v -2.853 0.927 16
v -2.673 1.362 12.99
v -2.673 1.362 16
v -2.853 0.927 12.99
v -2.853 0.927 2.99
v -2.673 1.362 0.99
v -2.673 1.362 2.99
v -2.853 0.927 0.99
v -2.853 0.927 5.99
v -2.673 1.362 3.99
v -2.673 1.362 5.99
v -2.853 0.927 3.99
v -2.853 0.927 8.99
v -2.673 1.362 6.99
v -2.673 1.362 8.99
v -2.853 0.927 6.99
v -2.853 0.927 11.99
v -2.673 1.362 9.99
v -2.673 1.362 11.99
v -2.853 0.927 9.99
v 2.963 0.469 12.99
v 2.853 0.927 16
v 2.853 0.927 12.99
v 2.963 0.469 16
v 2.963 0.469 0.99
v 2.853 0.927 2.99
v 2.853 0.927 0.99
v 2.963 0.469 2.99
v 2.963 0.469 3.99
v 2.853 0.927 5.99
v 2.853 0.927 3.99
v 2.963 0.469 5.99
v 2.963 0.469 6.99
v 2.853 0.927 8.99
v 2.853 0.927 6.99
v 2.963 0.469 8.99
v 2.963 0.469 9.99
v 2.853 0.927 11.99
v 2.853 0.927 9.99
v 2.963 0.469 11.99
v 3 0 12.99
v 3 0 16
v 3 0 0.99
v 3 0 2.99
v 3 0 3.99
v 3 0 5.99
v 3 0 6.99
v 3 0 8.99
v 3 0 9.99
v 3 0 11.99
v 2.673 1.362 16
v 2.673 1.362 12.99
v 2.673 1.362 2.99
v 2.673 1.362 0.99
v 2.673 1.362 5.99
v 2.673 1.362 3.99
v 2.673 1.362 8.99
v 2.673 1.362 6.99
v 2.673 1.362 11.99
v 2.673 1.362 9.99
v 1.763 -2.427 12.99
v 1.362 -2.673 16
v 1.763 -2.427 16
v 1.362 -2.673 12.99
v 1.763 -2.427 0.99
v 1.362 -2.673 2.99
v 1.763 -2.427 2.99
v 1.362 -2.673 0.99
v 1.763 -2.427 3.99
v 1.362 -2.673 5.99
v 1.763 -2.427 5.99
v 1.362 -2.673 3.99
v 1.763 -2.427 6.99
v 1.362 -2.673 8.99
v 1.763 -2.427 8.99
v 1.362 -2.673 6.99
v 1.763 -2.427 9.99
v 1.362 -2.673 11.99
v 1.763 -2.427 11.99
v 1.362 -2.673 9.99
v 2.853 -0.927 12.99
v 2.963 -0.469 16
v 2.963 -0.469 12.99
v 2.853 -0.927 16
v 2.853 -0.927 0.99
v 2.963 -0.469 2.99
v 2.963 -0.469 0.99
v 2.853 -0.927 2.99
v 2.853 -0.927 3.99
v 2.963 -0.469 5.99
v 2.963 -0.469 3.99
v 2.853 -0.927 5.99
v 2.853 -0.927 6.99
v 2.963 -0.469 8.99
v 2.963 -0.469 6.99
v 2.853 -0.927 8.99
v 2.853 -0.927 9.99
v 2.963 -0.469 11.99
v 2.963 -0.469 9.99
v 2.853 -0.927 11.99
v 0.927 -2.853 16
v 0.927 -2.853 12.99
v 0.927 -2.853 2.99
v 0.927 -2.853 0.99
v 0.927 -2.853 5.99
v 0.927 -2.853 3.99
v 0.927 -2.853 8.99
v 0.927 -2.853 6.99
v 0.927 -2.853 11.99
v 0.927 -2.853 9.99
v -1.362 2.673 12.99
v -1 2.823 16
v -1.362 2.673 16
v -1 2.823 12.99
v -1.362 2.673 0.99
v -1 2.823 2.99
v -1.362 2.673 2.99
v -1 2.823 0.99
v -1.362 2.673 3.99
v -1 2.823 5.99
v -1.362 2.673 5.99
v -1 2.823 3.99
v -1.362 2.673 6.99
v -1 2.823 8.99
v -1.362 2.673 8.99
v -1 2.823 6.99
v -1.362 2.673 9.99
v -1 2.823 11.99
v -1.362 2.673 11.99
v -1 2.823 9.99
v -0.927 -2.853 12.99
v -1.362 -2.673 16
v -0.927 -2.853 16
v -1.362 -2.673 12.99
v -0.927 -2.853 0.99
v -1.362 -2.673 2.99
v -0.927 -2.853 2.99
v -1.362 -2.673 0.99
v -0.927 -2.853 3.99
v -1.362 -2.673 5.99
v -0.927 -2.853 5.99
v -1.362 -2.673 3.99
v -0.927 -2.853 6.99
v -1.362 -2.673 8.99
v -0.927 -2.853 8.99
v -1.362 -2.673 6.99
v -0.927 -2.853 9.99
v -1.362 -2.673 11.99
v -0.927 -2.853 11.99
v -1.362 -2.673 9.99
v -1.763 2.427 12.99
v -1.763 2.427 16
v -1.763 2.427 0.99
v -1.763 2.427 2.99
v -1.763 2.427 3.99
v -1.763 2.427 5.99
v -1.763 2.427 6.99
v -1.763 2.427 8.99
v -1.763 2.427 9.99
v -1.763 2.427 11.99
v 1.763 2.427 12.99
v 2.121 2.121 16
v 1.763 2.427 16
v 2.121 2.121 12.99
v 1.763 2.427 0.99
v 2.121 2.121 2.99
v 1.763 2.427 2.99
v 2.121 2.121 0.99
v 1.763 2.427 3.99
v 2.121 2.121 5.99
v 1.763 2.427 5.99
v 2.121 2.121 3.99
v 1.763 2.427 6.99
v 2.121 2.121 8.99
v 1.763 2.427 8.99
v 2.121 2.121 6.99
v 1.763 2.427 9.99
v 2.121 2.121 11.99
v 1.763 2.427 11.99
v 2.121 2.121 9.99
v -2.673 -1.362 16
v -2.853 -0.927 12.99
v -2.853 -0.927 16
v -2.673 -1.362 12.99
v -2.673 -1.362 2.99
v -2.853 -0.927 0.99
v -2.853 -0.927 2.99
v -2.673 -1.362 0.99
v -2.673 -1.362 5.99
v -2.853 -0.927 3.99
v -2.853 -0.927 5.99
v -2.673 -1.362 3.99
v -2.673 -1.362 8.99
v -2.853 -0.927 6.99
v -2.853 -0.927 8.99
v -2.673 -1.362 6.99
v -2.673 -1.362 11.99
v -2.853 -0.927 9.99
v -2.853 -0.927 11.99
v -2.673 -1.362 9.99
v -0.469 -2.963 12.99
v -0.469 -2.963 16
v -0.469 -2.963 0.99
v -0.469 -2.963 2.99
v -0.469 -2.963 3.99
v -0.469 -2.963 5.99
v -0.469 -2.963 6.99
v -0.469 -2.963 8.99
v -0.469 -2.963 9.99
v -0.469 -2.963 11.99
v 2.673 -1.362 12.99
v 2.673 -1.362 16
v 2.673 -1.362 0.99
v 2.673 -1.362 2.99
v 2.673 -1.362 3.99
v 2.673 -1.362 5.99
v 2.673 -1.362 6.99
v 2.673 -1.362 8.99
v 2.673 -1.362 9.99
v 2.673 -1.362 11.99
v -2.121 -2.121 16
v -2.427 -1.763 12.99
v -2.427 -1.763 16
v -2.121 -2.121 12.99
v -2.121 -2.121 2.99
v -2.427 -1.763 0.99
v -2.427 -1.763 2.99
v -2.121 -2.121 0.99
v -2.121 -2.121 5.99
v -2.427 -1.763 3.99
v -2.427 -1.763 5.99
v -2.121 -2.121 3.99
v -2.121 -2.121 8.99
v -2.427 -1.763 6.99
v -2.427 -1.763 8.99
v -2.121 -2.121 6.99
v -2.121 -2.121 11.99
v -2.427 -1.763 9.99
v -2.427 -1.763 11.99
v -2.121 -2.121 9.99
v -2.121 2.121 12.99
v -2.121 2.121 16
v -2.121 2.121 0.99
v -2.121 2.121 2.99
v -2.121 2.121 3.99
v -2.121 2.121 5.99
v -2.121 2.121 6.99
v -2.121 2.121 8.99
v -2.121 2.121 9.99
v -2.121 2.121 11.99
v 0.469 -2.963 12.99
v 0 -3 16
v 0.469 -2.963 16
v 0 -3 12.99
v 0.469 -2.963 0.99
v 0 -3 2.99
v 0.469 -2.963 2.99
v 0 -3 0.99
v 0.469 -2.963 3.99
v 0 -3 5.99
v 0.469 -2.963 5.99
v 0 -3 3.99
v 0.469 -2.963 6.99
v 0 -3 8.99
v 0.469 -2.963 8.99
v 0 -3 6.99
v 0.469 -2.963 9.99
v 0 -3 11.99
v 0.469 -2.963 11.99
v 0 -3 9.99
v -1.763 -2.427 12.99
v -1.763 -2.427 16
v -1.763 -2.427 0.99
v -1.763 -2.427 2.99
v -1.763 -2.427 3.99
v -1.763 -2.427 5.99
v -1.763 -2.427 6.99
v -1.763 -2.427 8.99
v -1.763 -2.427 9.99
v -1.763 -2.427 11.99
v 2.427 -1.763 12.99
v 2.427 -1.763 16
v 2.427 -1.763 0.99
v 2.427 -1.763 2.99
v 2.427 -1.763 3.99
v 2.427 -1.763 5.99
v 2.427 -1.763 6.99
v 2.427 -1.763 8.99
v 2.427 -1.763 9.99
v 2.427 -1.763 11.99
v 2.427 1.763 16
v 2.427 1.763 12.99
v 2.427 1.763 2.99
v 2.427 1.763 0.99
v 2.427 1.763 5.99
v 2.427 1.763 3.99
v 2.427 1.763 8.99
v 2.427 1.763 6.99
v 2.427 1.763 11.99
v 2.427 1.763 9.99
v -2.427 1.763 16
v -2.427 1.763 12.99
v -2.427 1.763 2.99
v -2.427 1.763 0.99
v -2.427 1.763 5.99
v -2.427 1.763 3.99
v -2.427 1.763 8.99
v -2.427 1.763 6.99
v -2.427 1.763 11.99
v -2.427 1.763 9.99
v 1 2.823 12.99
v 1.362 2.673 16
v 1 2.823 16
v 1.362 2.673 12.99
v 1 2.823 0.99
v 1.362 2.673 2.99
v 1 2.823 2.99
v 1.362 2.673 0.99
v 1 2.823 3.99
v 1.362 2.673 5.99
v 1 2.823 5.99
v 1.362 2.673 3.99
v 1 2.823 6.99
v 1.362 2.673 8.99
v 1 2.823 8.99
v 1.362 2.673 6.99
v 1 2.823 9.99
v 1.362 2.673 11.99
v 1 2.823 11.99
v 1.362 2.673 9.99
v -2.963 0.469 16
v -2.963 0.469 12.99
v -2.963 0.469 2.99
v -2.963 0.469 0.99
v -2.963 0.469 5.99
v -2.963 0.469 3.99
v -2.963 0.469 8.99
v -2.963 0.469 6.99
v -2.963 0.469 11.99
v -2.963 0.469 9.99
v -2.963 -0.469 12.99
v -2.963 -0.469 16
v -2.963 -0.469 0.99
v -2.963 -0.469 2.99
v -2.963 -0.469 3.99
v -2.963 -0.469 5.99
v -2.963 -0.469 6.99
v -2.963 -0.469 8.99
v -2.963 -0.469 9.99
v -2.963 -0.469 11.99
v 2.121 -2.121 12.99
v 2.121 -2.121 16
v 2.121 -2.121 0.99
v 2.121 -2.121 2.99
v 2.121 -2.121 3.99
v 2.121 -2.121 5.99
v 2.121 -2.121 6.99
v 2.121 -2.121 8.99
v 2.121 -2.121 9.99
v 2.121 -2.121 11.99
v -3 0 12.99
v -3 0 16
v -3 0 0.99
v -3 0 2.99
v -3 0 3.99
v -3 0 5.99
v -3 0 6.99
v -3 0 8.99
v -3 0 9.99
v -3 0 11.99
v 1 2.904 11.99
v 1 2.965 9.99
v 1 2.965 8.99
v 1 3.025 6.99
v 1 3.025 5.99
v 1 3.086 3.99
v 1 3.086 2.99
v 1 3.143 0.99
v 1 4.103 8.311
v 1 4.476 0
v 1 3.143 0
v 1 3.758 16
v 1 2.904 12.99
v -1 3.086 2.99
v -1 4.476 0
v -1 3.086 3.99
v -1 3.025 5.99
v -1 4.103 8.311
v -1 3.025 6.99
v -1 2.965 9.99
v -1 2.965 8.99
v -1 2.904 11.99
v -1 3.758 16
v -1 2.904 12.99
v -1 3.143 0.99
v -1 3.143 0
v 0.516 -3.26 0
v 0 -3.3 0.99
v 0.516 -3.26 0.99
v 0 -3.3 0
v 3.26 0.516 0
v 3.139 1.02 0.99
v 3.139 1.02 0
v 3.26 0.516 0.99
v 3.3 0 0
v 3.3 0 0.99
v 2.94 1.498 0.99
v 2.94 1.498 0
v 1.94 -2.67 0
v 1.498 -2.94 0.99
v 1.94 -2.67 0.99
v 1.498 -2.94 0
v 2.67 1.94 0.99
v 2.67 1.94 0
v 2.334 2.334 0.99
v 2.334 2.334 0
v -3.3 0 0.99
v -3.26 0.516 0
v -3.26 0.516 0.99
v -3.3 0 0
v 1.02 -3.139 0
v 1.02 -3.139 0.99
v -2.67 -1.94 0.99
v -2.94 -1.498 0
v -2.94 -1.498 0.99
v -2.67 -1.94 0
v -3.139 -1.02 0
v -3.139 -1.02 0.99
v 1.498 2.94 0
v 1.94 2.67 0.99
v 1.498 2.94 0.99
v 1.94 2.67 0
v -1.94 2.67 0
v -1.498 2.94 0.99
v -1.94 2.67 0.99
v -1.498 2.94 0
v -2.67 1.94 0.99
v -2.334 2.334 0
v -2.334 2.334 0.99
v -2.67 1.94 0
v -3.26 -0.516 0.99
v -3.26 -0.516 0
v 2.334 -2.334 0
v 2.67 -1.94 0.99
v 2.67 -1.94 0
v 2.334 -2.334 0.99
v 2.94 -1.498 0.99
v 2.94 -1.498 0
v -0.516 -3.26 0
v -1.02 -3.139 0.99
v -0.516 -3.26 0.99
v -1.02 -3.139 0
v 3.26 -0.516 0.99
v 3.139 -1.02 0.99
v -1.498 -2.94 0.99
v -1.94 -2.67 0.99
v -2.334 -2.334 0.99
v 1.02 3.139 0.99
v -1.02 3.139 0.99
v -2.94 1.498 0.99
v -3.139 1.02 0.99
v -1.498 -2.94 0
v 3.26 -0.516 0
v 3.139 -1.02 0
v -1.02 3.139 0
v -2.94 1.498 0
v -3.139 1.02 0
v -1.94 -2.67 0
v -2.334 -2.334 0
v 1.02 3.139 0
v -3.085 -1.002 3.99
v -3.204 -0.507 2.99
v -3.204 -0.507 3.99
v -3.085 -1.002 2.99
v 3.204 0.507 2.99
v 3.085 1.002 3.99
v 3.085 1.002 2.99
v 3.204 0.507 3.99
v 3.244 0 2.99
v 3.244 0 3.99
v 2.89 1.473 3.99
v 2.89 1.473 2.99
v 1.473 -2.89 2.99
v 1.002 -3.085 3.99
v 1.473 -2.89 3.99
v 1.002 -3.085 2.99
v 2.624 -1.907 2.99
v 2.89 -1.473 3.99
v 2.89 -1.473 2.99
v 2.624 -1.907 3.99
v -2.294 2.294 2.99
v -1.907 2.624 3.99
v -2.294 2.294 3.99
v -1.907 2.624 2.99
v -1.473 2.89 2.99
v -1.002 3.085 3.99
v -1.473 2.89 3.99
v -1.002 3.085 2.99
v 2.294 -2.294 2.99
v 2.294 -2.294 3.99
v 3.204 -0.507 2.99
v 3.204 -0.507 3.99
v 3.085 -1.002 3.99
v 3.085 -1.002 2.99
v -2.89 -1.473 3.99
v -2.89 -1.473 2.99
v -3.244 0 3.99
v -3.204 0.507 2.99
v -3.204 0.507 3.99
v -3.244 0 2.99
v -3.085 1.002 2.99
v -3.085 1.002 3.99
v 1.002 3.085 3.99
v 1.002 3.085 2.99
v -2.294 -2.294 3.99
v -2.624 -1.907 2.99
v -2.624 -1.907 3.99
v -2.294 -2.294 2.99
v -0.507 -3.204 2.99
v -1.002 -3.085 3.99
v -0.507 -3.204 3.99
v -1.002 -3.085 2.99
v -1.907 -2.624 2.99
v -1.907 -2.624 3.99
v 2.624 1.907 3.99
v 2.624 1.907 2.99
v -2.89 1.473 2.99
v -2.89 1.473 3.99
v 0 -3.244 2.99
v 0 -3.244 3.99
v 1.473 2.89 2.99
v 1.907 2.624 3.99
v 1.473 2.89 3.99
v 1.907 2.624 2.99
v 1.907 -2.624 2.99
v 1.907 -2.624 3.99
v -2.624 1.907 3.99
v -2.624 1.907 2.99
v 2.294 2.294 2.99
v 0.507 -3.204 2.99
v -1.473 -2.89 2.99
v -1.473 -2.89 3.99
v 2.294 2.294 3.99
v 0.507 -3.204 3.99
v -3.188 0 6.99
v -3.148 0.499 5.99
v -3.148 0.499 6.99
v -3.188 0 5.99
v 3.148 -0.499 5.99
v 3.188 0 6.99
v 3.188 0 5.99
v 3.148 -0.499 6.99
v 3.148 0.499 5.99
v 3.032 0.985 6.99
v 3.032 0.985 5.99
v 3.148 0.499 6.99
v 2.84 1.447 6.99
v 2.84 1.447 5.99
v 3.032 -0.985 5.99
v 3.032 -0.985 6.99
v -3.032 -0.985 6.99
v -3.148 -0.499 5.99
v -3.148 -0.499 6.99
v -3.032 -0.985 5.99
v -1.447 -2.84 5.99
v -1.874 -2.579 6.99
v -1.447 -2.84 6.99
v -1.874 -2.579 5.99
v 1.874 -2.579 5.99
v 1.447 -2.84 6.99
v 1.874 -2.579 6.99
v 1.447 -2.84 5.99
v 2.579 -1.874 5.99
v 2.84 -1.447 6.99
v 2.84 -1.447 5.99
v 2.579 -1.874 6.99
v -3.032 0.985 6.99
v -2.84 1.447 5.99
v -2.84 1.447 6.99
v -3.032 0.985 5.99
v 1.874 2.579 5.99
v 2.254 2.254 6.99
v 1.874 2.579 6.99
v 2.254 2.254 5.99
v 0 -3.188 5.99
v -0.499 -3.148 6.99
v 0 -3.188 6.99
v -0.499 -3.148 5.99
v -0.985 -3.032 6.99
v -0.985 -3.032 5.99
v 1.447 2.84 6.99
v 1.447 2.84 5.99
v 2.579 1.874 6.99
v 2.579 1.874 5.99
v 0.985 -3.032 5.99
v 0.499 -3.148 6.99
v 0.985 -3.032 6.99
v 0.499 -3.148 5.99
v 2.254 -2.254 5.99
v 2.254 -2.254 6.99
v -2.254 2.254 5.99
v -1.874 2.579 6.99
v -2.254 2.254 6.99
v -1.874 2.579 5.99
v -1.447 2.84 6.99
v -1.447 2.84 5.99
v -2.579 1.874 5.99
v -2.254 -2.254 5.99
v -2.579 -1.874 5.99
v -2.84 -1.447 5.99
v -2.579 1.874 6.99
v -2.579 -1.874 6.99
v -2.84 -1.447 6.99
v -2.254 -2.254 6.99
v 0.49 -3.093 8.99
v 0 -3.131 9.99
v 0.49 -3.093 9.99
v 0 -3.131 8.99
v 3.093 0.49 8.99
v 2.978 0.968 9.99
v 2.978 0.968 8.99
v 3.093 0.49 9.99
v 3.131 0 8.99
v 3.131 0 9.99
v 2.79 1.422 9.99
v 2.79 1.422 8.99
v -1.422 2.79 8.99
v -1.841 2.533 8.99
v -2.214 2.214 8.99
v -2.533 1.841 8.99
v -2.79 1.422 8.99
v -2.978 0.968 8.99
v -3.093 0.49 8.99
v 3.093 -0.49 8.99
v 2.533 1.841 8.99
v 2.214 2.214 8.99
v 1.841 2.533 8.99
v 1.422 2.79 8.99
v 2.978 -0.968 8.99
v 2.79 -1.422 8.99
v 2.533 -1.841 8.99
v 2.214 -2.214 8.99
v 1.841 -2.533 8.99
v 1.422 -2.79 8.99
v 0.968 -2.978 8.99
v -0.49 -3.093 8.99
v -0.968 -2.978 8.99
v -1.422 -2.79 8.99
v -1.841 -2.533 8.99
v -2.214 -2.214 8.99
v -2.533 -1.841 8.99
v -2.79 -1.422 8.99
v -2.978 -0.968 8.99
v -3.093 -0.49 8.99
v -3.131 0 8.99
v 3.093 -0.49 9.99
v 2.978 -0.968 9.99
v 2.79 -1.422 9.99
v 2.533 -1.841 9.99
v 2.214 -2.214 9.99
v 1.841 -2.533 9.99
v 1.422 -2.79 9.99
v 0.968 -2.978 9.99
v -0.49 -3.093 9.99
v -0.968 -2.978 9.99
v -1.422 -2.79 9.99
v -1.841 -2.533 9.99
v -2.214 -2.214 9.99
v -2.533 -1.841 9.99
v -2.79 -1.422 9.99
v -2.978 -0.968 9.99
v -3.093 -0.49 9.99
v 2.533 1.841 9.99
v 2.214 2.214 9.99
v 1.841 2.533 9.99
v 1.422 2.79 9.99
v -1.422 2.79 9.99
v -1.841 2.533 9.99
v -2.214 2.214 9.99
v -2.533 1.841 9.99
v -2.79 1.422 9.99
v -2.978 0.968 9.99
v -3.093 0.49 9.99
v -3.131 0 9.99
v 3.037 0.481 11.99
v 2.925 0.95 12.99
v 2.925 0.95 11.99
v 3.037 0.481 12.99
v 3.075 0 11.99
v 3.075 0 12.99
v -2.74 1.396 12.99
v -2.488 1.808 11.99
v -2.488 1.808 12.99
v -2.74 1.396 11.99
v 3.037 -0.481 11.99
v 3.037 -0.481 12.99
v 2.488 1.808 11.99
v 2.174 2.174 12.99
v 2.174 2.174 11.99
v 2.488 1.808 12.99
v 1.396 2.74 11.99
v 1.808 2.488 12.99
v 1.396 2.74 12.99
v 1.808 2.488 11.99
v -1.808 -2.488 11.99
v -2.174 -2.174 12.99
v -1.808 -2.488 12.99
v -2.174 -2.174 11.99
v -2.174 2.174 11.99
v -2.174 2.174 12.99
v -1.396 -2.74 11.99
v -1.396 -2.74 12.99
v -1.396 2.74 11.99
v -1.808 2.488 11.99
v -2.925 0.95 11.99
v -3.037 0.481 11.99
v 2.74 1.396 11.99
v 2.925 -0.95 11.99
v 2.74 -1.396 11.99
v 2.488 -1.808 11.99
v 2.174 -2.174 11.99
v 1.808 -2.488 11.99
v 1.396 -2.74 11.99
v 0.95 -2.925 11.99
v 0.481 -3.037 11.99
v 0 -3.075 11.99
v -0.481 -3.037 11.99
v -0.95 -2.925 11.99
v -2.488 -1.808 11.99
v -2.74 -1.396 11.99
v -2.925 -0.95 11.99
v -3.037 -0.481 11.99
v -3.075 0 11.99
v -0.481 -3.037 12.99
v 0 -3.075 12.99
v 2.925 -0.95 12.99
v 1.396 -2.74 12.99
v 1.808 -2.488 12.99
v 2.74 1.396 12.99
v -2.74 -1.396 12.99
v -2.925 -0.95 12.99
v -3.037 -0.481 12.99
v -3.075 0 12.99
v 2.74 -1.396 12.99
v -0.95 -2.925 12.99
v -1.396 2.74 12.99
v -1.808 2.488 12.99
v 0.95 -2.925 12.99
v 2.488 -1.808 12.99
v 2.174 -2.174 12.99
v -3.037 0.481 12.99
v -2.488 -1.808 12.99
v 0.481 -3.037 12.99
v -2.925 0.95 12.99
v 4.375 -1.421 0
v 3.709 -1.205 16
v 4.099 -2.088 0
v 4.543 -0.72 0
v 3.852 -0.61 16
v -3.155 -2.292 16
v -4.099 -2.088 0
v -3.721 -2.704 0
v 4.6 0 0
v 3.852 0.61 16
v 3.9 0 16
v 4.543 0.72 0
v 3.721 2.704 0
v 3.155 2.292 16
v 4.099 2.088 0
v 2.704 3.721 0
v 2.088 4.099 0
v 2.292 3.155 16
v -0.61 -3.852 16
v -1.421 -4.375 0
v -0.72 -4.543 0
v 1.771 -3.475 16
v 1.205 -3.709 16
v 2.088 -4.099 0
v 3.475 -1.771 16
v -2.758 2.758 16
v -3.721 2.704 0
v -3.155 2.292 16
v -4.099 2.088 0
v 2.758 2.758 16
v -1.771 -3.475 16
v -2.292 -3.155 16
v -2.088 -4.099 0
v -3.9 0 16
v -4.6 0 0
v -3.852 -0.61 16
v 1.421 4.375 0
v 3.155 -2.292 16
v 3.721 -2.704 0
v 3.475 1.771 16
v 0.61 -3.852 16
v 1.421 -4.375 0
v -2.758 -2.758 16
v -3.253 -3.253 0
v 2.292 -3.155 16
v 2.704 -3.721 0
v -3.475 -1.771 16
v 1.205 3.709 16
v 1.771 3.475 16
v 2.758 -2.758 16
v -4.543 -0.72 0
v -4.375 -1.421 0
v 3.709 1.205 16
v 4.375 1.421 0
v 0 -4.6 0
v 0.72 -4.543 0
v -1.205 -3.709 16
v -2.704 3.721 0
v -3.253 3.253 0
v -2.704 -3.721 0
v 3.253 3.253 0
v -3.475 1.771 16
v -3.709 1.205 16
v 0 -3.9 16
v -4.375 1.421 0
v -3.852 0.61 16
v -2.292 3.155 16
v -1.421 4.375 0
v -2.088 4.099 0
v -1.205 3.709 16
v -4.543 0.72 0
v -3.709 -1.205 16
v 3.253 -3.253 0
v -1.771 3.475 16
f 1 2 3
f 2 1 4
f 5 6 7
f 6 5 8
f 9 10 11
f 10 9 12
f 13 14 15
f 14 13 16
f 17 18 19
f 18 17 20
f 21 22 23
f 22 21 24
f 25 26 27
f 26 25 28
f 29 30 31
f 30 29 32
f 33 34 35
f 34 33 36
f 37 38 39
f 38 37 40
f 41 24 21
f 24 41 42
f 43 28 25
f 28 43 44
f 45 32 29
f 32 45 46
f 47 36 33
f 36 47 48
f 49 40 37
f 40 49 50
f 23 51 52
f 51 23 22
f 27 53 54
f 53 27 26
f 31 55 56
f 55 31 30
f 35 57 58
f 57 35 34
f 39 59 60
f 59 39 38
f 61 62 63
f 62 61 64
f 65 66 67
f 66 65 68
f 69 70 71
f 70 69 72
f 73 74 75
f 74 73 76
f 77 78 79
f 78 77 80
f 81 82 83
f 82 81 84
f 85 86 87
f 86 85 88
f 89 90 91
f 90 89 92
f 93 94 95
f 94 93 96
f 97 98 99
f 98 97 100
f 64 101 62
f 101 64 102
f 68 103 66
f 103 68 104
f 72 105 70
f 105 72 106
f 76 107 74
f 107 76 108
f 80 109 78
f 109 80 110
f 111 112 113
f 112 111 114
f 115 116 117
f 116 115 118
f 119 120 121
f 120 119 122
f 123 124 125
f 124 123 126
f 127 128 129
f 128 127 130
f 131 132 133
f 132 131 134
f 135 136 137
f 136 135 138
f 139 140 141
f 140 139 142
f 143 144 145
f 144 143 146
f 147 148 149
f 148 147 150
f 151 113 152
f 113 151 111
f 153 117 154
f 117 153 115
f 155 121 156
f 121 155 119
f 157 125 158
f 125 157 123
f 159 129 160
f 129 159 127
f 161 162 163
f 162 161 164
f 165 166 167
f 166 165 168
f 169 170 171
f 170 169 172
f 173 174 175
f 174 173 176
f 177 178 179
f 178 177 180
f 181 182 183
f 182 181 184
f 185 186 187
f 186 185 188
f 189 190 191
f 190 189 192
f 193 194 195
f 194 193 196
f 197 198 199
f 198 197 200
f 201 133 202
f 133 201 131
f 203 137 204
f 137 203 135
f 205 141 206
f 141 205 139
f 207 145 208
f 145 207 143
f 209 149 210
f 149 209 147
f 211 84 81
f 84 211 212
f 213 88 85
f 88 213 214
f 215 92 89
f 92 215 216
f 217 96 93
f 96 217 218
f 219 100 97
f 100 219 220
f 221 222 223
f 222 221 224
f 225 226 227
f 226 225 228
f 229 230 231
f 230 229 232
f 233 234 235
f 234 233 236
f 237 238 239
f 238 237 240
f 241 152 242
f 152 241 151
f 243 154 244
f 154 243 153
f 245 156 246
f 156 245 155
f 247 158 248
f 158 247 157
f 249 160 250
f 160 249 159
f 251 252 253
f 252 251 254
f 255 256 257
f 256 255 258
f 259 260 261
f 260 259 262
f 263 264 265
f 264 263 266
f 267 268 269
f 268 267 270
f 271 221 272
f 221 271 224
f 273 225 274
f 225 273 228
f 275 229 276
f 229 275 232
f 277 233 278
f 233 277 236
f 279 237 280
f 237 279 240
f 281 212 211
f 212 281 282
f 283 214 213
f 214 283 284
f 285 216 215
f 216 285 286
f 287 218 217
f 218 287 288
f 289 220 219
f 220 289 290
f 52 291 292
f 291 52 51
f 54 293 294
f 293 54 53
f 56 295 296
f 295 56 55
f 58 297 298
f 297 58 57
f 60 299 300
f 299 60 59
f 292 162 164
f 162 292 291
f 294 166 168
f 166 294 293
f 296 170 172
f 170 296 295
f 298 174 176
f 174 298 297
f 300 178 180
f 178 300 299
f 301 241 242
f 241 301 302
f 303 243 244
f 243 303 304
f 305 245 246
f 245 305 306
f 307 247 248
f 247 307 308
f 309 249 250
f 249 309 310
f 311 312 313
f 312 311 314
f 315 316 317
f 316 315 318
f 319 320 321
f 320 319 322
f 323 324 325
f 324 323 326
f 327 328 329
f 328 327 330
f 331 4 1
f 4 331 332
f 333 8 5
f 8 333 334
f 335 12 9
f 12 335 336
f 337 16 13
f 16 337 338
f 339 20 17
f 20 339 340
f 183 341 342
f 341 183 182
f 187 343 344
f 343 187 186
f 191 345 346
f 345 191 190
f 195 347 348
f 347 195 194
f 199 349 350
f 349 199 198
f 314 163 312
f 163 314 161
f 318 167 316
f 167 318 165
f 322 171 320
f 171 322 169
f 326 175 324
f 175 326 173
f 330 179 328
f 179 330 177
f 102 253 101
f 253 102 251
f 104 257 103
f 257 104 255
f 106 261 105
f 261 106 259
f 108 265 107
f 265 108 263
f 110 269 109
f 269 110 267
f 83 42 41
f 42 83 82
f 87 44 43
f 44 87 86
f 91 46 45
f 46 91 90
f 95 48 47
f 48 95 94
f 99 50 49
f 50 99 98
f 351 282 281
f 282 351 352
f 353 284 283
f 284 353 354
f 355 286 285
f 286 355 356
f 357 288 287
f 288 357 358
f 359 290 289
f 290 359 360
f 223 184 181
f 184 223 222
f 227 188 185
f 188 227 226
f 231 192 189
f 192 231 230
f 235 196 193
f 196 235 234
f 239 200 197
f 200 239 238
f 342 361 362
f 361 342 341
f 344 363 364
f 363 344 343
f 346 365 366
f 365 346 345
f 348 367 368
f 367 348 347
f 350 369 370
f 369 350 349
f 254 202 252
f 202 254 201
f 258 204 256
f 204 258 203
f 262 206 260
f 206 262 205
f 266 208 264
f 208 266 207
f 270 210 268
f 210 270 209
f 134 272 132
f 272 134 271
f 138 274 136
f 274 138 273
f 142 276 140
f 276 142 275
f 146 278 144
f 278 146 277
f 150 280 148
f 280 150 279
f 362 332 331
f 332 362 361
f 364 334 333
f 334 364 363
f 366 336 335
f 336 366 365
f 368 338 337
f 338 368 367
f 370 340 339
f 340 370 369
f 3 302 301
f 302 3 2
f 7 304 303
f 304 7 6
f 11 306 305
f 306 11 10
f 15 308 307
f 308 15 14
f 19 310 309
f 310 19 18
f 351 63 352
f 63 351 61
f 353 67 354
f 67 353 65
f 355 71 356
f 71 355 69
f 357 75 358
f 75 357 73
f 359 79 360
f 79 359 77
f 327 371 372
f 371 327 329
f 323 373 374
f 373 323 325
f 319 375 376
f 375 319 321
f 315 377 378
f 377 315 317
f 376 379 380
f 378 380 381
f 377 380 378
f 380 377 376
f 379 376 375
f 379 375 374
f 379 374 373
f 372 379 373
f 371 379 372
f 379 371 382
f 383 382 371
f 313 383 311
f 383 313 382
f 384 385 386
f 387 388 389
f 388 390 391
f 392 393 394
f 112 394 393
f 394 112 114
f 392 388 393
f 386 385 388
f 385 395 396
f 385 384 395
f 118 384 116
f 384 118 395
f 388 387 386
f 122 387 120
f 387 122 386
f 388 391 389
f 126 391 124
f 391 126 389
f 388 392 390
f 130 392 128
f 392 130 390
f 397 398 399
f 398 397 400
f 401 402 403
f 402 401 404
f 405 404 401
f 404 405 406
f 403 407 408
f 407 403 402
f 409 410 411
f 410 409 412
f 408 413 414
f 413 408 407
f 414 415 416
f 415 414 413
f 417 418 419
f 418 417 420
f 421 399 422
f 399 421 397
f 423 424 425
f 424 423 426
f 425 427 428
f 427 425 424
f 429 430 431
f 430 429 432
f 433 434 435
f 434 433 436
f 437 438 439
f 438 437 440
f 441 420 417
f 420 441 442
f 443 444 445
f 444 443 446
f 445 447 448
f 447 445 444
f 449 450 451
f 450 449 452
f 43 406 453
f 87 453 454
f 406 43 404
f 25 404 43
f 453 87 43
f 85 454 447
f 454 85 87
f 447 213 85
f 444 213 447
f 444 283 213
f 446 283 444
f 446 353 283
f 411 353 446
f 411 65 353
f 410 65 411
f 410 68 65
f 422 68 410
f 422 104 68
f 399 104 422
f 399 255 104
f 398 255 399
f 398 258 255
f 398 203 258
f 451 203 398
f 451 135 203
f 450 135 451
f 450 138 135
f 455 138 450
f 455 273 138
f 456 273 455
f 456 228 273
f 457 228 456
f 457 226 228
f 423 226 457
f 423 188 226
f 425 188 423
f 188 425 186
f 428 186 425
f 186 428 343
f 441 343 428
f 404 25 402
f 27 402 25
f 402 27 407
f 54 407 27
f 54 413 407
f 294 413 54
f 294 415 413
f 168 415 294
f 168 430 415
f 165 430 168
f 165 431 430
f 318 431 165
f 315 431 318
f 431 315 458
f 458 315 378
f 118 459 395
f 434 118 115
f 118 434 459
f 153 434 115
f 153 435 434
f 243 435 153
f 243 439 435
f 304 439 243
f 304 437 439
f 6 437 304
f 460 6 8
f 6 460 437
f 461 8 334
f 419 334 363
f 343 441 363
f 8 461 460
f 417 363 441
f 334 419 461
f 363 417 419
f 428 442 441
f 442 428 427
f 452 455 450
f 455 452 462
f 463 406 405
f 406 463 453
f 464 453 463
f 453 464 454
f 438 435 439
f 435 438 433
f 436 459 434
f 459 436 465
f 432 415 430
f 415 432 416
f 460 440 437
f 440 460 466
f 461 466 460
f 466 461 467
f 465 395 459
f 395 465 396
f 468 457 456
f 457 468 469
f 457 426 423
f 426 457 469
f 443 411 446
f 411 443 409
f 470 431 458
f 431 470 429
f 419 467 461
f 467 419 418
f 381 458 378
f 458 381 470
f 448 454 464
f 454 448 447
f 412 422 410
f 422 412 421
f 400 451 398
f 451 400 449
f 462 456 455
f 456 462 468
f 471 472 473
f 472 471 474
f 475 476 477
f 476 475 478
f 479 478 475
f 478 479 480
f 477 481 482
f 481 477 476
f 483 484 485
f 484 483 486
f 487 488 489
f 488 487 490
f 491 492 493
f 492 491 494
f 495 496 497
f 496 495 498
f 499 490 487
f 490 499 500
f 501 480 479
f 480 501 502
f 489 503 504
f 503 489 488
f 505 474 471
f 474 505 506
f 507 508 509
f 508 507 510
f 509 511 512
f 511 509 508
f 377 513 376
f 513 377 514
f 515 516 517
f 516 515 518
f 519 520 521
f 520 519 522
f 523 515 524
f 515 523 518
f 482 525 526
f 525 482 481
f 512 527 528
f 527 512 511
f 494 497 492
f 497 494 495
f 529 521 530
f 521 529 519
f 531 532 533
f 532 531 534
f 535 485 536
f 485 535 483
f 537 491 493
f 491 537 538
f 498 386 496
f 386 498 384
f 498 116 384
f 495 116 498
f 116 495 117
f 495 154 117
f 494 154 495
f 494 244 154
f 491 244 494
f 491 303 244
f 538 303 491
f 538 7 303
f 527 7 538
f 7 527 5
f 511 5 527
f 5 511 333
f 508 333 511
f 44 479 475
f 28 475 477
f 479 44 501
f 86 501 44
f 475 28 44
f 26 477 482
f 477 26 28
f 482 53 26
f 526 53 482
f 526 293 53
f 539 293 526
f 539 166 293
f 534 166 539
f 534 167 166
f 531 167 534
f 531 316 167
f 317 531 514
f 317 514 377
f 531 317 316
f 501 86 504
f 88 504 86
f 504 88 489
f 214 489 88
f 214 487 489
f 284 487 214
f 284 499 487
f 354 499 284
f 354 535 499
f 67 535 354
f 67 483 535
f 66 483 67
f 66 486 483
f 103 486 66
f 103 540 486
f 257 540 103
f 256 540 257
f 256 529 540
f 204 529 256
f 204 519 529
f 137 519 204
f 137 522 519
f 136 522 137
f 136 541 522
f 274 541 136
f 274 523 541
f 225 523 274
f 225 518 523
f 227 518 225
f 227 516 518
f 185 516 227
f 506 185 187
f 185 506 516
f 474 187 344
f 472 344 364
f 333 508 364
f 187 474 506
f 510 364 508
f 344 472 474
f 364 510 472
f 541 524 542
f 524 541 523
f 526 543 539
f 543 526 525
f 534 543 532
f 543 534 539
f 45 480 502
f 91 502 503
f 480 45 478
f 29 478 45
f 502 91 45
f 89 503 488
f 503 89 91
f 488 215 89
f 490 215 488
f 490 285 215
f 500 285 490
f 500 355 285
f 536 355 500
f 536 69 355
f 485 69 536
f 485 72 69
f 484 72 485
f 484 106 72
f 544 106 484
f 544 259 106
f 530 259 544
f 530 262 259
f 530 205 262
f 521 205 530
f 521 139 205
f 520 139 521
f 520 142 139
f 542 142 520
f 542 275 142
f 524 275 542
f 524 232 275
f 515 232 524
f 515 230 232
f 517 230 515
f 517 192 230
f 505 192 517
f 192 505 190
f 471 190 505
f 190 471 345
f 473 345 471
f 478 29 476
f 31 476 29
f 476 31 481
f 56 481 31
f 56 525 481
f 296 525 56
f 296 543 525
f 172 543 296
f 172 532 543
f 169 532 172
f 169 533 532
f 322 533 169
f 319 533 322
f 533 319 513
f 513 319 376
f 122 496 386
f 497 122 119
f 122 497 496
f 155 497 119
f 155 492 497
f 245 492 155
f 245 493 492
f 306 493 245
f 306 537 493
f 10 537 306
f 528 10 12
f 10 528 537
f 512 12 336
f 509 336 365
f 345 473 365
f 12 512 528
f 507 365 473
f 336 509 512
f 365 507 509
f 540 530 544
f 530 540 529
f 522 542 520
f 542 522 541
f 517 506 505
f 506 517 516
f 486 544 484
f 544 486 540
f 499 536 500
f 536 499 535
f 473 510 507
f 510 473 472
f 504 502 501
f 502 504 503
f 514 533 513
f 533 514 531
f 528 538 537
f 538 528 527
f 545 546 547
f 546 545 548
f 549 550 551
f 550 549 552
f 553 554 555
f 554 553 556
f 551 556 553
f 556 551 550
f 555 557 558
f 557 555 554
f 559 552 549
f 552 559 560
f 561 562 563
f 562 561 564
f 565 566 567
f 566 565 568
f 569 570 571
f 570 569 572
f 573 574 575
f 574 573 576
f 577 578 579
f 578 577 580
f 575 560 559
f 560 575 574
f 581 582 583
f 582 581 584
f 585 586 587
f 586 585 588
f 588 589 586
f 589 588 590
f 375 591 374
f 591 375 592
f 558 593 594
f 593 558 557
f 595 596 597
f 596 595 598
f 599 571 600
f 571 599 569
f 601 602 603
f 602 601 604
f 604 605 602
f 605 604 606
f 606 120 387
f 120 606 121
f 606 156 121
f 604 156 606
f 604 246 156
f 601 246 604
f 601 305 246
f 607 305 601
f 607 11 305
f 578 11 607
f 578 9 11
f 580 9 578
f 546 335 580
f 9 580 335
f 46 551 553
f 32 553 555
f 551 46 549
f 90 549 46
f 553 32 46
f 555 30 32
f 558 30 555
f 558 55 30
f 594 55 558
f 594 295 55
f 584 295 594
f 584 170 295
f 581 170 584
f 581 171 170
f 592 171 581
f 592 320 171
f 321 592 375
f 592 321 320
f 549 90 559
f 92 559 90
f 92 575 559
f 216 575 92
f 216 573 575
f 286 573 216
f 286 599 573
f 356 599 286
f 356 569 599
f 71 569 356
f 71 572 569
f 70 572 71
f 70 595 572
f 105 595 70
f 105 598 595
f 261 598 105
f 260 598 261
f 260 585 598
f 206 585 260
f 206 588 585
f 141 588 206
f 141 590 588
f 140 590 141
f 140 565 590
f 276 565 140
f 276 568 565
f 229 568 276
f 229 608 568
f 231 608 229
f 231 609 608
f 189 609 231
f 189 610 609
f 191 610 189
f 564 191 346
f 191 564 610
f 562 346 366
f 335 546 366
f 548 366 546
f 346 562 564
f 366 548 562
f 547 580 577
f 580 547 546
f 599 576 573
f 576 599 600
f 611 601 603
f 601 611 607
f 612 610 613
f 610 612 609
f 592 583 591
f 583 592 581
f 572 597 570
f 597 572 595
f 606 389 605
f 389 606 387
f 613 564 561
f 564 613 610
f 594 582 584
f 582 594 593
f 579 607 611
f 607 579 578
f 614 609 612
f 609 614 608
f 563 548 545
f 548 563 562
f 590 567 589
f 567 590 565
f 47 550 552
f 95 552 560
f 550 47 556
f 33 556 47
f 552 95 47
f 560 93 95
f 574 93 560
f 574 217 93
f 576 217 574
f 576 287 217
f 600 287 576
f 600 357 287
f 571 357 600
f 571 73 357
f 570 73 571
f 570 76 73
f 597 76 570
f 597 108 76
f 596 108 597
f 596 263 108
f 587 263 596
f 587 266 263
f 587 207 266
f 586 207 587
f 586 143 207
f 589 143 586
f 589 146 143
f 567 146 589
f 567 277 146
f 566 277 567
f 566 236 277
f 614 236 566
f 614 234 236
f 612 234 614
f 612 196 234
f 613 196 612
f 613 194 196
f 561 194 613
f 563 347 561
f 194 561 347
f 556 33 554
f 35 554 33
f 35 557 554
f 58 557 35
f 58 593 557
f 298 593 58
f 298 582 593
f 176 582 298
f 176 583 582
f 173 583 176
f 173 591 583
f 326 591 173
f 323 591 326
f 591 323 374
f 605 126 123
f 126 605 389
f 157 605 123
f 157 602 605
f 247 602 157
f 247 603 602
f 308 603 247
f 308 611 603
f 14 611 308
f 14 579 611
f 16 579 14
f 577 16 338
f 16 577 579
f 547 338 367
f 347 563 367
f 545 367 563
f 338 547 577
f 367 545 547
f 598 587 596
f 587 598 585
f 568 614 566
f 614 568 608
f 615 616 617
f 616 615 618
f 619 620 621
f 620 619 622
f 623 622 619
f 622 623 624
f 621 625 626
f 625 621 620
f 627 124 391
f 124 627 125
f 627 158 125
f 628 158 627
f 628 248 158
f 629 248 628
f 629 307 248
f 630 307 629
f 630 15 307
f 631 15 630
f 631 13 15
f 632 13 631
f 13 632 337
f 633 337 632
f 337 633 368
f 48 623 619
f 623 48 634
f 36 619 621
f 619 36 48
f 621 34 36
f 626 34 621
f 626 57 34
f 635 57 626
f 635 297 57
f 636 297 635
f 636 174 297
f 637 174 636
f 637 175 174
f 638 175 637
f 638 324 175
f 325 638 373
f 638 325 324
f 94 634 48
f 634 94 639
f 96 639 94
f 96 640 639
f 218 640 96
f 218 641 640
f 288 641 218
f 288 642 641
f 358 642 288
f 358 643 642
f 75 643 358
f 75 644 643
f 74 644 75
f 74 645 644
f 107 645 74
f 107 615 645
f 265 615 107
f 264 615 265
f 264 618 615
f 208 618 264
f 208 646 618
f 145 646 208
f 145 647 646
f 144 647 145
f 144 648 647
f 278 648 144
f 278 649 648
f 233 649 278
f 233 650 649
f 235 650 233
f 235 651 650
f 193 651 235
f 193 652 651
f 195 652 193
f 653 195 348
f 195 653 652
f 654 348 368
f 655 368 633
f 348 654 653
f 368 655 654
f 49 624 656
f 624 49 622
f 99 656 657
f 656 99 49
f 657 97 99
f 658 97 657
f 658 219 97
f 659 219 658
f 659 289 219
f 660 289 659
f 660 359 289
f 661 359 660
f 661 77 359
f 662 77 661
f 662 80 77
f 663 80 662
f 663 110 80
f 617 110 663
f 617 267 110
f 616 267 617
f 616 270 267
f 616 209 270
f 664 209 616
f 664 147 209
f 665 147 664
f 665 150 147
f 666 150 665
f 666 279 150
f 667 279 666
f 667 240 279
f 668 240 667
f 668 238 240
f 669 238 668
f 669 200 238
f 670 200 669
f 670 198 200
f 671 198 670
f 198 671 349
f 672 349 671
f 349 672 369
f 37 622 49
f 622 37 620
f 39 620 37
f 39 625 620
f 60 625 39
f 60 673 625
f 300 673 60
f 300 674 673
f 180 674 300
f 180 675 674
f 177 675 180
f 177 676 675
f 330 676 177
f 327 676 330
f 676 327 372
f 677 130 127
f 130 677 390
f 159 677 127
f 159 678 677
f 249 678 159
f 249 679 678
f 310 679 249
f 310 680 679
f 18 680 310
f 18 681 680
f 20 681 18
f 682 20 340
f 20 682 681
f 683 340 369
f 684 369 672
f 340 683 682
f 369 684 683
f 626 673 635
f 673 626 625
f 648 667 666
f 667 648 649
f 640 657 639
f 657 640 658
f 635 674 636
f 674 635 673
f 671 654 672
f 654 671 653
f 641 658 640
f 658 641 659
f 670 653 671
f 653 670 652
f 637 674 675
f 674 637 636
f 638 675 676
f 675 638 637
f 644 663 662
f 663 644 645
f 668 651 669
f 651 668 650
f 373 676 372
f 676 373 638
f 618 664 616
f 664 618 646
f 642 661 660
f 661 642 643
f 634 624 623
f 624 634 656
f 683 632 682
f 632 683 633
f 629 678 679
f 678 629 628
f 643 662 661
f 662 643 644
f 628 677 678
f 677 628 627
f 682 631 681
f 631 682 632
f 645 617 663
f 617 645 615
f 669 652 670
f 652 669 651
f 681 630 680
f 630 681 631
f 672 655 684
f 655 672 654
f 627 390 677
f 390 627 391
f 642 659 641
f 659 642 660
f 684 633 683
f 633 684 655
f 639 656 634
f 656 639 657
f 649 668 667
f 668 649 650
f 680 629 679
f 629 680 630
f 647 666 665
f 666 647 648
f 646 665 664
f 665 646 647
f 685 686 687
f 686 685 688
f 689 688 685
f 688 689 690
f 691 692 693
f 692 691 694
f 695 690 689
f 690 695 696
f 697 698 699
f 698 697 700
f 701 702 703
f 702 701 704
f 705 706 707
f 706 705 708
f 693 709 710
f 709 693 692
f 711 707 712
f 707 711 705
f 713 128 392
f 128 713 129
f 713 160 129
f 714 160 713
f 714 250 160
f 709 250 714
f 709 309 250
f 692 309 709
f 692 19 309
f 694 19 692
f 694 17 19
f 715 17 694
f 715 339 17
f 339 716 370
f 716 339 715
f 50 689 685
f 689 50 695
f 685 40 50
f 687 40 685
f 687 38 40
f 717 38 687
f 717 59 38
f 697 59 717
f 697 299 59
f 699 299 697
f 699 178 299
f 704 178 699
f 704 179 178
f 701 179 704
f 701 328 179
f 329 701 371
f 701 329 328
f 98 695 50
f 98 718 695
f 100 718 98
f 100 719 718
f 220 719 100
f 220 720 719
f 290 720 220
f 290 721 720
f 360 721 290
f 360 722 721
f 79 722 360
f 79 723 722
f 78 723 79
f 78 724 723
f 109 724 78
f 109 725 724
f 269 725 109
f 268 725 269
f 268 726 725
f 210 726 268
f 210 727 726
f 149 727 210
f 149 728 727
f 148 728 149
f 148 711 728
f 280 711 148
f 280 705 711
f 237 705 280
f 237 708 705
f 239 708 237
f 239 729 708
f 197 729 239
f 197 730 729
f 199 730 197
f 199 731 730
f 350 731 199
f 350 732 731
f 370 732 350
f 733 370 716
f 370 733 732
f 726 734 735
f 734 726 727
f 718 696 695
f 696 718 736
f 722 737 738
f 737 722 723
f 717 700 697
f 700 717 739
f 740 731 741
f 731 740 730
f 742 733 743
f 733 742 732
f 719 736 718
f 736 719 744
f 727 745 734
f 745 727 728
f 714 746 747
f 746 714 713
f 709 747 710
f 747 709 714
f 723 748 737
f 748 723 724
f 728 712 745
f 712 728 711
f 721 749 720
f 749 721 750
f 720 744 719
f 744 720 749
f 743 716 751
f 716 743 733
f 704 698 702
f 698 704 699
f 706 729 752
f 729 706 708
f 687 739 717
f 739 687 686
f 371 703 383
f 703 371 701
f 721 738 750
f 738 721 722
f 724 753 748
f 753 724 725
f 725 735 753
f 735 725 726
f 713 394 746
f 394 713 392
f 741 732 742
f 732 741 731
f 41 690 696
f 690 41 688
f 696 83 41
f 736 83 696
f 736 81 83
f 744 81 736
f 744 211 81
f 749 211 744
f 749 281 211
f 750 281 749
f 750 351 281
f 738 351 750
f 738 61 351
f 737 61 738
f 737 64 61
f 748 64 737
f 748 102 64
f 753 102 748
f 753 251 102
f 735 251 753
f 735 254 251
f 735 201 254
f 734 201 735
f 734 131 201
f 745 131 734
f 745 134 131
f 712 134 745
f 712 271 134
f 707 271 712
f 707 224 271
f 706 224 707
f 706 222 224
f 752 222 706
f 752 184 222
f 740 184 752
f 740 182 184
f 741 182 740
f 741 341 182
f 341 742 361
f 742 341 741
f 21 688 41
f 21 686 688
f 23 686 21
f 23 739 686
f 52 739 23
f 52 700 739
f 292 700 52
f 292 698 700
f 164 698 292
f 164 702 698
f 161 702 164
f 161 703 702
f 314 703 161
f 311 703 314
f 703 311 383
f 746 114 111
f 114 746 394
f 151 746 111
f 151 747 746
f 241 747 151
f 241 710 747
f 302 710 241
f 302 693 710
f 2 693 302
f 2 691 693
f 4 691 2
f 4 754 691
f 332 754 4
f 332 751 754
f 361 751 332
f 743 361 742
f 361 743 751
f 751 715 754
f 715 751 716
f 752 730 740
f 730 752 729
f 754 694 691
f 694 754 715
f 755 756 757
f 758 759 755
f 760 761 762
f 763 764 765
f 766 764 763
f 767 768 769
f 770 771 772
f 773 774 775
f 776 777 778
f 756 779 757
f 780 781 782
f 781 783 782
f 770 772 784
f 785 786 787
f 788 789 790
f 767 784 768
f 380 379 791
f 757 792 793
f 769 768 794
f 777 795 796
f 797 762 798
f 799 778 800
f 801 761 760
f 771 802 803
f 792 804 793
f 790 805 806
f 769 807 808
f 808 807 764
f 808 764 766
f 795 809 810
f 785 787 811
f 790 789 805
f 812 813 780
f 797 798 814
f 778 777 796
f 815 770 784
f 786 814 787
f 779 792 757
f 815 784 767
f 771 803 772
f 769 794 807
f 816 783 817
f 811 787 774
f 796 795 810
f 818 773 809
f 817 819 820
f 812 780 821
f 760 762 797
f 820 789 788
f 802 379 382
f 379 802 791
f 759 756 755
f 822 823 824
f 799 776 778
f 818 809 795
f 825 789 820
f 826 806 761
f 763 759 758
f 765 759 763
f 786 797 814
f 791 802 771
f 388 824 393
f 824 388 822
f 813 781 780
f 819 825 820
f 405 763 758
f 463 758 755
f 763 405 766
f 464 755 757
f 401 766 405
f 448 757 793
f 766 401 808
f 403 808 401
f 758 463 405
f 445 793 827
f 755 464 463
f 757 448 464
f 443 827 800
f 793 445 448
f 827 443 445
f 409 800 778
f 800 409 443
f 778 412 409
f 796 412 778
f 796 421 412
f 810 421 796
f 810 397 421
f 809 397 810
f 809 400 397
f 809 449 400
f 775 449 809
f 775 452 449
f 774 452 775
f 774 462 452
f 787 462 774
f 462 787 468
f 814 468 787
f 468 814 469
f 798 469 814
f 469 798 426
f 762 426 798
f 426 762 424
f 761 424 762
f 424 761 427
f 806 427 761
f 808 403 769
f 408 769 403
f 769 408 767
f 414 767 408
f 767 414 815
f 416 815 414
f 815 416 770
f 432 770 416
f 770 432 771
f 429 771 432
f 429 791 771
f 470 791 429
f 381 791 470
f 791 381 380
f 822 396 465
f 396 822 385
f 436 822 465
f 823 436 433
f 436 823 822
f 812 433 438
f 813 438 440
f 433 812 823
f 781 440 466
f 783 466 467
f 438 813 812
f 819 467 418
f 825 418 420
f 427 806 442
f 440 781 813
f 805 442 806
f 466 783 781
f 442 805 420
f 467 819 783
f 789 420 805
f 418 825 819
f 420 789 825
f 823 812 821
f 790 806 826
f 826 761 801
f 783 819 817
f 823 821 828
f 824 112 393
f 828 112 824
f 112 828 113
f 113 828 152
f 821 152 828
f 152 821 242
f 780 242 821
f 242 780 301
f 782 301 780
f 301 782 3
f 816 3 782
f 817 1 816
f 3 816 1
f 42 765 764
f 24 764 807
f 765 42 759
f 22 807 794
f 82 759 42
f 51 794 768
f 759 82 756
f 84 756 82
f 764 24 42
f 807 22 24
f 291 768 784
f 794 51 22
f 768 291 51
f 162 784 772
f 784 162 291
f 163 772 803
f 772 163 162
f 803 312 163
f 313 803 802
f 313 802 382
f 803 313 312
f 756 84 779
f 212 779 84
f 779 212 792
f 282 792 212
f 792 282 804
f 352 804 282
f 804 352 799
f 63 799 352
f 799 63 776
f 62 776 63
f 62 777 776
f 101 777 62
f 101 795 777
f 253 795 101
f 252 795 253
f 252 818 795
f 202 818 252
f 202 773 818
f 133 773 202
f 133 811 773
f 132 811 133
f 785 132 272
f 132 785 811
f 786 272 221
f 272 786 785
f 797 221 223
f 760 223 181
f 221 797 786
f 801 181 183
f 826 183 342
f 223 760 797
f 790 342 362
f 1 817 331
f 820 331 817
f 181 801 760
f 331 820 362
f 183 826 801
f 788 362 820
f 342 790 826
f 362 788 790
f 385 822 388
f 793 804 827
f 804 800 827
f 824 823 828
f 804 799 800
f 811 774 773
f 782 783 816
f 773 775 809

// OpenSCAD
// [FL_INDEX: keywords="openscad, 3d_parametric, Owen_s_Bowden_clamp__tightening_cone_improvement__parametric___inner_rings, csg_solid" | COT="Parametric OpenSCAD design from 3DCodeverse"]
// Title: Owen's Bowden clamp: tightening cone improvement (parametric + inner rings)

// (main) internal radius (bowden tube diameter)
ir=6;
// (main) cone height
ch=16;
// (main) outside radius (big one)
or1=9.2;
// (main) outside radius (small one)
or2=7.8;
// (optional) width of the vertical opening
gap=2;

// (optional) internal ripple width (at base of cone, will be zero on top)
rippler=0.3;
// (optional) internal ripple height
rippleh=1;
// (optional) internal ripple spacing (will be added to rippleh, ie one 1-mm shoulder with 2mm in between)
ripples=2;

// MoonCactus 2012 06 25 for "Bowden Clamp for Ultimaker (Feeder End)"
// http://www.thingiverse.com/thing:17027
//
// Most interesting values to tune are marked with two stars (**)
//

tol=0+0.01;	// to avoid equalities in shape removal, and let openscad preview work better ;)

$fn=0+40;		// high quality cylinders

difference()
{
	cylinder(r1=or1/2, r2=or2/2, h=ch);
	translate([0,0,-tol])
	{
		cylinder(r=ir/2,h=ch+2*tol);
		translate([-gap/2,0,0]) cube([gap,or1+tol,ch+2*tol]);
	}
	for(i=[-tol:(ripples+rippleh):ch-rippleh-2*tol])
		translate([0,0,i])
			cylinder(r=ir/2+rippler * (ch-i)/ch, h=rippleh);
}
